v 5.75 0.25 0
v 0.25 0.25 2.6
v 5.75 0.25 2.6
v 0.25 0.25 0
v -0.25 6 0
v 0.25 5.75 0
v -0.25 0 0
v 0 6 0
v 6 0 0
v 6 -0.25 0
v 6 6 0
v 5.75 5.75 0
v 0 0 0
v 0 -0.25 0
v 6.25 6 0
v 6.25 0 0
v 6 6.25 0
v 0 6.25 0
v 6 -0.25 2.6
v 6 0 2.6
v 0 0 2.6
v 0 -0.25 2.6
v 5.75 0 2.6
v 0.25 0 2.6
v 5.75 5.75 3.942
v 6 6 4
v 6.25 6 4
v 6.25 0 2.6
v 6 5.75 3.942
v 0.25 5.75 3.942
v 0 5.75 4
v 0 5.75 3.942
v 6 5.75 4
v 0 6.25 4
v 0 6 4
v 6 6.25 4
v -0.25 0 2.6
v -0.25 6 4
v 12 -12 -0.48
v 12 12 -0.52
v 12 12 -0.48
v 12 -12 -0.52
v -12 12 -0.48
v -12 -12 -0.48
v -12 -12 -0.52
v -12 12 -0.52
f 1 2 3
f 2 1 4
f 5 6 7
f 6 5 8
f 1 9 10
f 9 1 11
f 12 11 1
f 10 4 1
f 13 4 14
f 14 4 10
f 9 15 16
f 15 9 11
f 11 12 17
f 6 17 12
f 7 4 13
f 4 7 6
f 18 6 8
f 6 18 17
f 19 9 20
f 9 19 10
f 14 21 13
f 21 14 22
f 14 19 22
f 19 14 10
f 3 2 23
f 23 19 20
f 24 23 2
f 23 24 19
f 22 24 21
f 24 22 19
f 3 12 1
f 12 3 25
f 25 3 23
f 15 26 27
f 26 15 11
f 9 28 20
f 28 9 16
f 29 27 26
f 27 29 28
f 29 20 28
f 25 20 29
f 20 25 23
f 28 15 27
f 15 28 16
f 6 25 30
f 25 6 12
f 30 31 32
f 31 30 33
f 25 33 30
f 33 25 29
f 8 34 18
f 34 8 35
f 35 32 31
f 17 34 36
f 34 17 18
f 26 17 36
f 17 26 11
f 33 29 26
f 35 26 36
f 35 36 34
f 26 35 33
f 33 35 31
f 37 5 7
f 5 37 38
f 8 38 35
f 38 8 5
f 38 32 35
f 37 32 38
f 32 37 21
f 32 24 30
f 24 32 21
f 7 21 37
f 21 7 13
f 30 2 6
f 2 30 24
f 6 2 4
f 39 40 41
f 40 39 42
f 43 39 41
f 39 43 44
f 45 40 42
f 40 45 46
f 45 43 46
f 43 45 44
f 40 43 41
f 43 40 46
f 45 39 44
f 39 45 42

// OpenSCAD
// file: lib/measurement.scad
// Written in 2015 by Marius Kintel <marius@kintel.net>
// Additions 2020 by Mokshasoft AB
//
// To the extent possible under law, the author(s) have dedicated all
// copyright and related and neighboring rights to this software to the
// public domain worldwide. This software is distributed without any
// warranty.
//
// You should have received a copy of the CC0 Public Domain
// Dedication along with this software.
// If not, see <http://creativecommons.org/publicdomain/zero/1.0/>.

// Area of a triangle with the 3rd vertex in the origin
function triarea(v0, v1) = cross(v0, v1) / 2;

// Area of a polygon using the Shoelace formula
function area(vertices) =
  let (areas = [let (num=len(vertices))
                  for (i=[0:num-1]) 
                    triarea(vertices[i], vertices[(i+1)%num])
               ])
      sum(areas);

// Recursive helper function: Sums all values in a list.
// In this case, sum all partial areas into the final area.
function sum(values,s=0) =
  s == len(values) - 1 ? values[s] : values[s] + sum(values,s+1);

function length3D(p1, p2) =
    let ( v = p1 - p2 )
      sqrt( pow(v[0], 2)
          + pow(v[1], 2)
          + pow(v[2], 2));

function length(p1, p2) =
    sqrt(pow(p1[0] - p2[0], 2) + pow(p1[1] - p2[1], 2));

function vlength(p) =
  let ( num  = len(p)
      , lens = [for (i=[0:num-2]) length(p[i], p[i + 1])]
      )
    sum(lens);

function angle(p1, pc, p2) =
  let ( v1 = p1 - pc
      , v2 = p2 - pc
      , n1 = v1/norm(v1)
      , n2 = v2/norm(v2)
      )
    acos(n1*n2);
// file: lib/element.scad
// constants
gr = 1.61803; // golden ration

function inbetween(p1, p2, procent = 50) =
    let (x_diff = p2[0] - p1[0])
    let (y_diff = p2[1] - p1[1])
    [ p1[0] + x_diff*procent/100
    , p1[1] + y_diff*procent/100
    ];

// create a wall
module wall(p1, p2, h, thickness = 300) {
    let (x_diff = p2[0] - p1[0])
    let (y_diff = p2[1] - p1[1])
    let (len = sqrt(pow(x_diff, 2) +
                    pow(y_diff, 2)))
    if (h != 0)
    {
        linear_extrude(height = h)
        translate(p1)
        rotate(atan2(y_diff, x_diff))
        translate([0, -thickness/2])
        square([len, thickness]);
    }
    else
    {
        translate(p1)
        rotate(atan2(y_diff, x_diff))
        translate([0, -thickness/2])
        square([len, thickness]);
    }
}

// create a wall with two different heights
module wall2(p1, p2, h1, h2, thickness = 0.5) {
    let (x_diff = p2[0] - p1[0])
    let (y_diff = p2[1] - p1[1])
    let (len = sqrt(pow(x_diff, 2) +
                    pow(y_diff, 2)))
    if ((h1 == 0)&&(h2 == 0))
    {
        wall(p1, p2, 0, thickness);
    }
    else
    {
        translate(p1)
        rotate(atan2(y_diff, x_diff))
        rotate([90, 0, 0])
        linear_extrude(height = thickness, center = true)
        polygon(points=[[0,0],[len,0],[len,h2],[0,h1]]);
    }
}

module window(p1, p2, pos, height, sizex, sizey, wt = 300) {
    assert(0 < pos && pos < 100);
    x_diff = p2[0] - p1[0];
    y_diff = p2[1] - p1[1];
    len = sqrt(pow(x_diff, 2) +
               pow(y_diff, 2));
    difference () {
        children();
        // create the hole for the window
        translate([0,0,height])
        translate(p1 + pos*[x_diff, y_diff]/100)
        rotate(atan2(y_diff, x_diff) + 90, [0,0,1])
        cube([4*wt, sizex, sizey], center = true);
    }
    // add the glass to the window
    color_glass()
    translate([0,0,height])
    translate(p1 + pos*[x_diff, y_diff]/100)
    rotate(atan2(y_diff, x_diff) + 90, [0,0,1])
    translate([wt/2, 0, 0])
    cube([wt/2, sizex, sizey], center = true);
}

module plane(p1, p2, p3, p4) {
    v1 = [ p2[0] - p1[0]
         , p2[1] - p1[1]
         , p2[2] - p1[2]
         ];
    v2 = [ p2[0] - p3[0]
         , p2[1] - p3[1]
         , p2[2] - p3[2]
         ];
    hull()
        for(p=[p1, p2, p3, p4])
            translate(p) cube(0.000002, true);
}

module beam(p1, p2, r = 0.4) {
    vector = [ p2[0] - p1[0]
             , p2[1] - p1[1]
             , p2[2] - p1[2]
             ];
    distance = length3D(p1, p2);
    translate(vector/2 + p1)
    rotate([0, 0, atan2(vector[1], vector[0])]) // rotationXY
    rotate([0, atan2(sqrt(pow(vector[0], 2) + pow(vector[1], 2)), vector[2]), 0]) // rotationZX
    cylinder(h = distance, r = r, center = true);
}

module color_lawn() {
    color("LawnGreen")
    children();
}

module color_outer_wall() {
    color("MediumSpringGreen")
    children();
}

module color_inner_wall() {
    color("Ivory")
    children();
}

module color_roof() {
    color("Lavender")
    children();
}

module color_floor() {
    color("Wheat")
    children();
}

module color_logs() {
    color("Ivory")
    children();
}

module color_glass() {
    color("azure", 0.50)
    children();
}

// Regular polygons

// calculate the coordinates for the corners
function point(i, r, corners) =
   let (vz = 360/corners/2)
   let (angle=i*(360/corners) - vz)
   [ r*cos(angle)
   , r*sin(angle)
   ];

module octagon(r, h, corners) {
    coords=[for (i = [0:corners-1]) point(i, r, corners)];
    linear_extrude(height = h)
    polygon(coords);
}

module octawalls(r, h, wt, corners) {
    difference () {
        octagon(r, h, corners);
        translate([0, 0, -wt])
        octagon(r - wt, h + 2*wt, corners);
    }
}
// main file
include <lib/element.scad>
include <lib/measurement.scad>

// configure the rendering
show_floor = false;
show_roof = true;
show_lawn = true;

//// configure the house
// outer size
hw = 6; // house width
hl = 6; // house length
rhl = 2.6; // room height low
rhh = 4; // room height high

// Corners of the outer walls of house
p1 = [0, 0];
p2 = [hw, 0];
p3 = [hw, hl];
p4 = [0, hl];

// Lawn
if (show_lawn) {
    color_lawn()
    translate([0, 0, -0.5])
    cube([4*hw, 4*hw, 0.04], center = true);
}

module hus() {
    color_outer_wall()
    union() {
        // Outer walls
        wall2(p1, p2, rhl, rhl);
        wall2(p2, p3, rhl, rhh);
        wall2(p3, p4, rhh, rhh);
        wall2(p4, p1, rhh, rhl);
    }

    if (show_floor) {
        color_floor()
        linear_extrude(0.5)
        polygon([p1, p2, p3, p4]);
    }
}

hus();

// Measurements
echo("roof angle:", atan((rhh - rhl)/hl));
